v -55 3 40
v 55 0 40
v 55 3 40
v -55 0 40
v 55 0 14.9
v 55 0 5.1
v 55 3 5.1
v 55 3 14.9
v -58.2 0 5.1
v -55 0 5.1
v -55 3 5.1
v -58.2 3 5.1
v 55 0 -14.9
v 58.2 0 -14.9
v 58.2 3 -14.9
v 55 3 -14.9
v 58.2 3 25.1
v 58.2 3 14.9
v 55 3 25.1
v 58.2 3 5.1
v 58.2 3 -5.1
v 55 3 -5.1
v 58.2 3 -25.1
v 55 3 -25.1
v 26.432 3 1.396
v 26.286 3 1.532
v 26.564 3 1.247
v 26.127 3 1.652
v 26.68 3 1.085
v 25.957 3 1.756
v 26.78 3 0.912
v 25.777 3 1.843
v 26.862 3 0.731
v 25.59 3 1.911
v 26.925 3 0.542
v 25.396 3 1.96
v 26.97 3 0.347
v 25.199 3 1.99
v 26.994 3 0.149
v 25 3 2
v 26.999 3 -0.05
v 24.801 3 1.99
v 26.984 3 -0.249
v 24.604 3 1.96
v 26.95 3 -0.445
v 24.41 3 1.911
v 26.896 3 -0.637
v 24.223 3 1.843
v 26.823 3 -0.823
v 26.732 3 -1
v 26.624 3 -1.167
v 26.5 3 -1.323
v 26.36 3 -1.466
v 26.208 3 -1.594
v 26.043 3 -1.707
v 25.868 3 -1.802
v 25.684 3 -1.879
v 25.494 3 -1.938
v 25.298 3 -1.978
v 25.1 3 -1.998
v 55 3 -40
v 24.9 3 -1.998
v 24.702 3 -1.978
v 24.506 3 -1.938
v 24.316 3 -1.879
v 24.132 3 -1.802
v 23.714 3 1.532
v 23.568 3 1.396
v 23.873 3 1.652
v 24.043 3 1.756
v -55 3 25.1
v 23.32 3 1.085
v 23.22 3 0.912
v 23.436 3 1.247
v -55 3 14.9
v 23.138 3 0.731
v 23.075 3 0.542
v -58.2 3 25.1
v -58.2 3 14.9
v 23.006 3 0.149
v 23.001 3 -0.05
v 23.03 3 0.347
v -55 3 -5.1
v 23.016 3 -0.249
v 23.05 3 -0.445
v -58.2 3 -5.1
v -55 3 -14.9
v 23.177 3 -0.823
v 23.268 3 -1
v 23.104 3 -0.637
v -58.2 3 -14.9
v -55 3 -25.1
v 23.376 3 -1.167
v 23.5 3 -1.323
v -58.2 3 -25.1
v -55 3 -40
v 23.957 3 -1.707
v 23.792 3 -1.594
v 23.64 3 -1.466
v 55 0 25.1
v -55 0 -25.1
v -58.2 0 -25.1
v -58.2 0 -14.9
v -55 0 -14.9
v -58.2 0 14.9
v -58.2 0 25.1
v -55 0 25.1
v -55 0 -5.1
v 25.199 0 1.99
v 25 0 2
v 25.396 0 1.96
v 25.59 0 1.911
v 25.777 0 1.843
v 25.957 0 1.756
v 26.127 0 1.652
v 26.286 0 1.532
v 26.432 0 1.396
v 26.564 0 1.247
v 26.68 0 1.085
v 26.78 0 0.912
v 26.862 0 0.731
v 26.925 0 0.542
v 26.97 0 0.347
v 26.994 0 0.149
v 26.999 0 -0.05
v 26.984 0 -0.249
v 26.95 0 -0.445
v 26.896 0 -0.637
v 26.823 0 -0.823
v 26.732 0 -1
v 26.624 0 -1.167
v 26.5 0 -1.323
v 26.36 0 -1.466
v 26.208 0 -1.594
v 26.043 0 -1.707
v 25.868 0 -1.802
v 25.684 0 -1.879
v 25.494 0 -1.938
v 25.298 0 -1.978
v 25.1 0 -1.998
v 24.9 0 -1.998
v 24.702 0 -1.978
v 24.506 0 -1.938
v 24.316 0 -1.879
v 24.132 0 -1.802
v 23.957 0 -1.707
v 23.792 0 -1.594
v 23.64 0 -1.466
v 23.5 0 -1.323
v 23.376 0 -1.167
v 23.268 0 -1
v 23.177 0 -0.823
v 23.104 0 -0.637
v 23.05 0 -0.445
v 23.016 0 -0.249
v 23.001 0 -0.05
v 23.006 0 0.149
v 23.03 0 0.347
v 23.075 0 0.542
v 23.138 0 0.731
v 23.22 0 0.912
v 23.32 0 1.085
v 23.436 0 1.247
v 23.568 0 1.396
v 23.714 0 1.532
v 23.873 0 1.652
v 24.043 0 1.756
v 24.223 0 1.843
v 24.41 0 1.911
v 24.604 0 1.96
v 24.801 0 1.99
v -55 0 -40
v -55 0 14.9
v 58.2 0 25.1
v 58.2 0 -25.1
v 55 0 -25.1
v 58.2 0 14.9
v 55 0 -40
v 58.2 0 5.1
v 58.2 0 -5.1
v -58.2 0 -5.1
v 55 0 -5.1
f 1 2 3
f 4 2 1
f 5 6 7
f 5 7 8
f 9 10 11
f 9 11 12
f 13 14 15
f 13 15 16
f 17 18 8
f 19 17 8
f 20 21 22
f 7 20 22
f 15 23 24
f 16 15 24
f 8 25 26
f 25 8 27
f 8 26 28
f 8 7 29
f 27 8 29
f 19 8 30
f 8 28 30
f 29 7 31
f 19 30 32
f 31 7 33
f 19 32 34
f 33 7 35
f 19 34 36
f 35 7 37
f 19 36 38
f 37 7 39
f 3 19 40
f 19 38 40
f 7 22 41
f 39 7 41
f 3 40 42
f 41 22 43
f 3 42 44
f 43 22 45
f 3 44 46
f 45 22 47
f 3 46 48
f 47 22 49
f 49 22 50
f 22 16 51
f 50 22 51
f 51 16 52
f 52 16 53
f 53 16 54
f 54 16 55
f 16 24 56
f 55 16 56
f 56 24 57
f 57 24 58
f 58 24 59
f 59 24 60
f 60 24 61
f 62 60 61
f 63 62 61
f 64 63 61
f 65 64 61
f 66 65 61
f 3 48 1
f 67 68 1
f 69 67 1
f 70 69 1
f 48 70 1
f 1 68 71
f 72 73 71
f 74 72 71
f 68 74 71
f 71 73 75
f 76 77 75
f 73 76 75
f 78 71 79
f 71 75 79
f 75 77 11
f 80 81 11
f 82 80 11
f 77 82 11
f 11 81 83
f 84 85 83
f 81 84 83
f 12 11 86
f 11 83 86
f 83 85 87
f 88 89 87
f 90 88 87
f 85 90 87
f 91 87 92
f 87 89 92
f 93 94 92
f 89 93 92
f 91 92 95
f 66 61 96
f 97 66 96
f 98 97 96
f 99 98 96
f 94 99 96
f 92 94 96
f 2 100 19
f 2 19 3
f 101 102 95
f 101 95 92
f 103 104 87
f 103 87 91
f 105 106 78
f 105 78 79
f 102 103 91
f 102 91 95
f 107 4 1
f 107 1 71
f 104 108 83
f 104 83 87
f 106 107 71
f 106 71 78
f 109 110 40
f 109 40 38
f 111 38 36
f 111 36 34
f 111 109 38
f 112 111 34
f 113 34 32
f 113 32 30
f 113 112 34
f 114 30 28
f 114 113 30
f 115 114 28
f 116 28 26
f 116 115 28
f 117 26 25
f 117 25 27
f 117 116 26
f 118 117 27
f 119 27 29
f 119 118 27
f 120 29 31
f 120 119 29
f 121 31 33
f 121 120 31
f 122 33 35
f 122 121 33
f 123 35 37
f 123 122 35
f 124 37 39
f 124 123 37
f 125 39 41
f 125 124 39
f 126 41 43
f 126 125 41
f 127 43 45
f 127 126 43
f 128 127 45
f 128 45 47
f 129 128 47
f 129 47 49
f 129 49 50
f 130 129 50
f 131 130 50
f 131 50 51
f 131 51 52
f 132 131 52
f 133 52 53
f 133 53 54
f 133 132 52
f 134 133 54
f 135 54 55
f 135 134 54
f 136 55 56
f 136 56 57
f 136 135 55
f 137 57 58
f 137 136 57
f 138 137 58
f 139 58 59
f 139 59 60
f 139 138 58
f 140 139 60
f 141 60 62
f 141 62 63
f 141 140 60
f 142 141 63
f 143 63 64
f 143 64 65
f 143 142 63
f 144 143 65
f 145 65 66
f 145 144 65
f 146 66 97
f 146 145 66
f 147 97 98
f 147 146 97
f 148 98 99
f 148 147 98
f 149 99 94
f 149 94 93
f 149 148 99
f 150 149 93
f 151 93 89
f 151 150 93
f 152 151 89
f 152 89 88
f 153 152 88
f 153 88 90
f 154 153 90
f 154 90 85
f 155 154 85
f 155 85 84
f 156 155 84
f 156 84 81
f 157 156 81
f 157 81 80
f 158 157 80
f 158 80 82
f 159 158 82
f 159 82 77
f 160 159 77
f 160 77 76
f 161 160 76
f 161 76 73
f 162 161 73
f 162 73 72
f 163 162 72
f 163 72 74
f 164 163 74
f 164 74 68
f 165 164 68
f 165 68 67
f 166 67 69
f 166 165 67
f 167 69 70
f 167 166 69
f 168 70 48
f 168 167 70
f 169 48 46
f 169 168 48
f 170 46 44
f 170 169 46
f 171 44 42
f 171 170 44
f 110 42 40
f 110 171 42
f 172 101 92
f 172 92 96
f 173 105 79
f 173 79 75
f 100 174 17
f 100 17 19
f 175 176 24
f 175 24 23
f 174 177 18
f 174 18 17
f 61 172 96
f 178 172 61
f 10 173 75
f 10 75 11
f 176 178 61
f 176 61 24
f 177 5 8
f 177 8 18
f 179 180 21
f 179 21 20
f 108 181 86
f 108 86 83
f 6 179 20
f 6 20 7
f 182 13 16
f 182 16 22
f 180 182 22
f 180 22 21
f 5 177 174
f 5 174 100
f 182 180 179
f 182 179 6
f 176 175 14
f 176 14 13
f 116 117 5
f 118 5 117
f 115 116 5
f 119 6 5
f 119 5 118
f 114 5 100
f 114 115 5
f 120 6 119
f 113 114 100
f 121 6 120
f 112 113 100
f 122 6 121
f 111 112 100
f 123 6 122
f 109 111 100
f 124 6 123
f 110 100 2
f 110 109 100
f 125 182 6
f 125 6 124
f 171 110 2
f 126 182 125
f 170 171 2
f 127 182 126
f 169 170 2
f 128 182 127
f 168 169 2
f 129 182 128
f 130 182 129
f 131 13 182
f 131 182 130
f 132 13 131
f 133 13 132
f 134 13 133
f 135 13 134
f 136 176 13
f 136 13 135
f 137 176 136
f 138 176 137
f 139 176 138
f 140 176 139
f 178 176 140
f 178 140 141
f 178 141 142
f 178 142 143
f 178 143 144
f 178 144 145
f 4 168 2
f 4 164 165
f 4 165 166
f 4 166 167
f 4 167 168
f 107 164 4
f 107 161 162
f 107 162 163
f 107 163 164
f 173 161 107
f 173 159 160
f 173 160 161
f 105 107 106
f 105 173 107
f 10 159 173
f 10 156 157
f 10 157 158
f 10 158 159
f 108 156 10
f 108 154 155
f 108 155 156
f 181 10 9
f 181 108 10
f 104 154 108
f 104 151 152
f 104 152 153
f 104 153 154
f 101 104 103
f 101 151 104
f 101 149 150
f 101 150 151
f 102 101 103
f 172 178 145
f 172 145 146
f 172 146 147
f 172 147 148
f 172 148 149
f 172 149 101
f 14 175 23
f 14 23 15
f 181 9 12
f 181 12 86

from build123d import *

# Parameters (mm, degrees)
CROQUIS1_R              = 2
SALIENTE_EXTRUIR1_DEPTH = 3


with BuildPart() as part:
    # Croquis1 → Saliente-Extruir1 (new body)
    with BuildSketch(Plane(origin=(0, 0, 0), x_dir=(1, 0, 0), z_dir=(0, 1, 0))):
        Polygon((55, 14.9), (55, 5.1), (58.2, 5.1), (58.2, -5.1), (55, -5.1), (55, -14.9), (58.2, -14.9), (58.2, -25.1), (55, -25.1), (55, -40), (-55, -40), (-55, -25.1), (-58.2, -25.1), (-58.2, -14.9), (-55, -14.9), (-55, -5.1), (-58.2, -5.1), (-58.2, 5.1), (-55, 5.1), (-55, 14.9), (-58.2, 14.9), (-58.2, 25.1), (-55, 25.1), (-55, 40), (55, 40), (55, 25.1), (58.2, 25.1), (58.2, 14.9), align=None)
        with Locations(Location((25, 0, 0), (0, 0, 270))):
            Circle(CROQUIS1_R, mode=Mode.SUBTRACT)
    extrude(amount=SALIENTE_EXTRUIR1_DEPTH)


solid = part.part
